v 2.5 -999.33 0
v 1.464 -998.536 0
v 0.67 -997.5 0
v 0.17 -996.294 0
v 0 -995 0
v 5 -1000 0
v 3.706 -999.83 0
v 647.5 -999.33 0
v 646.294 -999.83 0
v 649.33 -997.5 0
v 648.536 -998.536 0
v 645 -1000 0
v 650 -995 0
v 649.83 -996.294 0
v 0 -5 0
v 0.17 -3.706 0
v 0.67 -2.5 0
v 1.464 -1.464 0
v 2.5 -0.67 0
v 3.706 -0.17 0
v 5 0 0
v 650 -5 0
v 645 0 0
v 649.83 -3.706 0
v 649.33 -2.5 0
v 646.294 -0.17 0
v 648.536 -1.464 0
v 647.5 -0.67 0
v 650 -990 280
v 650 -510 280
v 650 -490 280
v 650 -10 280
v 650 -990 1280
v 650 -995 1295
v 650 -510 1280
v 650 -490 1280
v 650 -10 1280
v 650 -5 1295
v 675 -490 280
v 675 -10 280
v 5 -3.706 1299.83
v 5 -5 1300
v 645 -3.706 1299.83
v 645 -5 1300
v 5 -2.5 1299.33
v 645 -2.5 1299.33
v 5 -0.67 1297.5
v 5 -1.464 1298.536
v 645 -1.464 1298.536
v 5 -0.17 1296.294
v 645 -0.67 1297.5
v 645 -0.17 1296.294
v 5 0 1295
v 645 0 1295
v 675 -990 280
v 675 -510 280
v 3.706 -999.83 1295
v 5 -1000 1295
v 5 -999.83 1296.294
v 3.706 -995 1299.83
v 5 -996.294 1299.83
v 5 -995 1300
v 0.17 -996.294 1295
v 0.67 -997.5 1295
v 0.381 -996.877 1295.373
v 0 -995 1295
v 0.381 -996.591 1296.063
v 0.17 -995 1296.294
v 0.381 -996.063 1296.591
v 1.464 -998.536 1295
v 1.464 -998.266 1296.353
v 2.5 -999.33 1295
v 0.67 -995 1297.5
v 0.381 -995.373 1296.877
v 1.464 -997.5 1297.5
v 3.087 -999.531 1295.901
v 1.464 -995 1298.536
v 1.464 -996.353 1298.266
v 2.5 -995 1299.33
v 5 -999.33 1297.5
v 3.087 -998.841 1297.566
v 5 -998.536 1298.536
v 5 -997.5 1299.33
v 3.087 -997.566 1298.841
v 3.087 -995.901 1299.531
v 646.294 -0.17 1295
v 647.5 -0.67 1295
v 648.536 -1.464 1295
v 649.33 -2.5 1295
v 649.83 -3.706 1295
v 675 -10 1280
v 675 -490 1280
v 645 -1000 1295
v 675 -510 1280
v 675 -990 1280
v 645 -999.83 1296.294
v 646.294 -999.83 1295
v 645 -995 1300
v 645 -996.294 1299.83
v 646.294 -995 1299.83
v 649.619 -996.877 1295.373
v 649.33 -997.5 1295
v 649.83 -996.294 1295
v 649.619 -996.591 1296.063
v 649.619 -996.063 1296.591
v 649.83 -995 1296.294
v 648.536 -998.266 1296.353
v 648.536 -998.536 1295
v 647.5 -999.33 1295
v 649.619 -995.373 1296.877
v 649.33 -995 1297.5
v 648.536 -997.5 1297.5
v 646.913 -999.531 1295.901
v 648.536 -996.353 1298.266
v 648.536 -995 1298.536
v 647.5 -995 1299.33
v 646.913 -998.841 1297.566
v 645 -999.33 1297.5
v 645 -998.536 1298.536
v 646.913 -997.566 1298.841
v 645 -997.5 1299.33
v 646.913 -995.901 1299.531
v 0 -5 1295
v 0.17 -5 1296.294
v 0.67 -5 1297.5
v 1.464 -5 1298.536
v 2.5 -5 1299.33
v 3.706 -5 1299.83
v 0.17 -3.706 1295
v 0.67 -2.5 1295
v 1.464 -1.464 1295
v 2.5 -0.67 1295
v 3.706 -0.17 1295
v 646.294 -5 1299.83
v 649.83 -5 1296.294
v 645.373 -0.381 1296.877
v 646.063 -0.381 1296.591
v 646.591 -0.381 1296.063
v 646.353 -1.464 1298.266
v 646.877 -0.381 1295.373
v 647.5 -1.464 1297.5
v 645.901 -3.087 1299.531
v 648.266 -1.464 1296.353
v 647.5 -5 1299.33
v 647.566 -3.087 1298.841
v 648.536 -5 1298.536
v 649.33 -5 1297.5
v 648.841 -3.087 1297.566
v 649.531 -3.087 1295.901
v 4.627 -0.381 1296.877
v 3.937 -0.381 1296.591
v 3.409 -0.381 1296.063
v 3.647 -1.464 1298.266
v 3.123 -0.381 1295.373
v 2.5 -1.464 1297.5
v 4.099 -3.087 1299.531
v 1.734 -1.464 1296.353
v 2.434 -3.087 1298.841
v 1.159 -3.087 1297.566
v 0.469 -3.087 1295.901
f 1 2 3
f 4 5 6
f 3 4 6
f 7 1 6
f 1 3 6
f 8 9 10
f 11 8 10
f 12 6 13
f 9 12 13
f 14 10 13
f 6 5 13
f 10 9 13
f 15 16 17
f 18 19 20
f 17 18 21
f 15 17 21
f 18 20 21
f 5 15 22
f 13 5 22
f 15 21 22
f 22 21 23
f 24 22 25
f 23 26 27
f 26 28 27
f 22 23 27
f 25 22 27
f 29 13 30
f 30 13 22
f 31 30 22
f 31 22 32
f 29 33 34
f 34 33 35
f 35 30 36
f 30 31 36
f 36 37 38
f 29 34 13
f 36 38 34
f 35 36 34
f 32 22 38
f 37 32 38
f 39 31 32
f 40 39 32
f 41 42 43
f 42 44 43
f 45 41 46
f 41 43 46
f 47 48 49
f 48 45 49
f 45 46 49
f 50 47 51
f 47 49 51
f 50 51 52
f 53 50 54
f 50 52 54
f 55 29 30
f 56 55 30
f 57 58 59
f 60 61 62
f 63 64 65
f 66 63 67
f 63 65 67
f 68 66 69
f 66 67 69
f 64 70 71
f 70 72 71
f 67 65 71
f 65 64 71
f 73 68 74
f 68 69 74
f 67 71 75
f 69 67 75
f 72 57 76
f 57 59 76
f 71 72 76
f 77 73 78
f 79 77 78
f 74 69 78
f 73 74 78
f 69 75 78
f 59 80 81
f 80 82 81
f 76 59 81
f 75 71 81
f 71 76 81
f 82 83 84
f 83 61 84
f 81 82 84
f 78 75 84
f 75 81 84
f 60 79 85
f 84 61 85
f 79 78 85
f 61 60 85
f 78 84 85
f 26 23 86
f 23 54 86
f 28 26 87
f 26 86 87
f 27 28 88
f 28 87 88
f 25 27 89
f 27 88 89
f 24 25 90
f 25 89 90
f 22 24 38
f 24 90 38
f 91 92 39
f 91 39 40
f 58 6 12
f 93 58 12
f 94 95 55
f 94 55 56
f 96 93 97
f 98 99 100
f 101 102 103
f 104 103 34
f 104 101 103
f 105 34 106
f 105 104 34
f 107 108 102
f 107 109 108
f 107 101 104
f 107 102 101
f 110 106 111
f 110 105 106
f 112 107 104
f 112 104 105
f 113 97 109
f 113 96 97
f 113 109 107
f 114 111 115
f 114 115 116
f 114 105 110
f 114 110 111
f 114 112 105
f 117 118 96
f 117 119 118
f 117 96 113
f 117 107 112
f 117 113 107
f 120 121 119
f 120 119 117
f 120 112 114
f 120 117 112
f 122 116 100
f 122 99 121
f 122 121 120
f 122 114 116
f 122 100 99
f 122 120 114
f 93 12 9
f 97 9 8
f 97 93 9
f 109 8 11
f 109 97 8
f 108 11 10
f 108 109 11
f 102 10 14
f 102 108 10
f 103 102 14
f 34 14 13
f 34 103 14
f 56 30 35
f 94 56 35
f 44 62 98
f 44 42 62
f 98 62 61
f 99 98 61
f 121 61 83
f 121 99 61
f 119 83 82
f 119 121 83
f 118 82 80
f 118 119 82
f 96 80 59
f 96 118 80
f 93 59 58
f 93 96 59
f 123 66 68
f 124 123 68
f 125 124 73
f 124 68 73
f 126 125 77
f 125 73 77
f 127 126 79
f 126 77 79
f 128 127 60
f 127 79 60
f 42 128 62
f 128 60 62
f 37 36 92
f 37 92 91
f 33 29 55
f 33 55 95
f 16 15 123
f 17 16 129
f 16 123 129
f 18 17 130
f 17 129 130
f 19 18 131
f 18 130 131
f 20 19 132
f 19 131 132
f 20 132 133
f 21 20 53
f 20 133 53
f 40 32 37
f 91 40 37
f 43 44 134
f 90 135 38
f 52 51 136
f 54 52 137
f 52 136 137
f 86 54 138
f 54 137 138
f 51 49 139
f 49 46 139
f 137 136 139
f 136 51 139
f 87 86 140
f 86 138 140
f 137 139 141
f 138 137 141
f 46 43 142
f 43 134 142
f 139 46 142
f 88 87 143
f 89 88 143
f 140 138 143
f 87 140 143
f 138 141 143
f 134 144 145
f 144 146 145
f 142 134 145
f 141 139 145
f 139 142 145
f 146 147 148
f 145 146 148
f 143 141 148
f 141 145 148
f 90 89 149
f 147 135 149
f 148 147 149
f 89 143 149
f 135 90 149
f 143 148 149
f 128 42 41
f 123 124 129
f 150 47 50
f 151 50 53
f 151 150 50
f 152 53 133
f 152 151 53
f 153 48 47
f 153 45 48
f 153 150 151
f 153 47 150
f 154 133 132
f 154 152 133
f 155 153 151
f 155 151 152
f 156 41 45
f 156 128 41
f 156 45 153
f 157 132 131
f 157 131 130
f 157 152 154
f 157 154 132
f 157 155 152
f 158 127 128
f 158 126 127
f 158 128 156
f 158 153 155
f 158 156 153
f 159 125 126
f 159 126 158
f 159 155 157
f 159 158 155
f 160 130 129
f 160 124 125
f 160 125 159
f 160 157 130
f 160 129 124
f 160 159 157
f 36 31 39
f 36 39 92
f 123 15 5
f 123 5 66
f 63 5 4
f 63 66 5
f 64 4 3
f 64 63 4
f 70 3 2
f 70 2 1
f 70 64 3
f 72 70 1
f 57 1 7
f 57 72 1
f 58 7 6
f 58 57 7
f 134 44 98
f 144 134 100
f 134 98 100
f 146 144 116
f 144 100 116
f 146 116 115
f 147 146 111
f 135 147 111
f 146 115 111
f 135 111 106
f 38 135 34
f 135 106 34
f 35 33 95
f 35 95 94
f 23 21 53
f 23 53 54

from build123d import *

# Parameters (mm, degrees)
F0_W     = 650
F0_H     = 1300
F1_DEPTH = 1000
F2_W     = 480
F2_H     = 1000
F3_DEPTH = 25
F4_R     = 5


with BuildPart() as f1:
    # F0 (on Front) → F1 (new body)
    with BuildSketch(Plane.XZ):
        with Locations((325, 650)):
            Rectangle(F0_W, F0_H)
    extrude(amount=F1_DEPTH)

    # F2 (on face) → F3 (join)
    with BuildSketch(Plane.YZ.offset(650)):
        with Locations((-250, 780)):
            Rectangle(F2_W, F2_H)
        with Locations((-750, 780)):
            Rectangle(F2_W, F2_H)
    extrude(amount=F3_DEPTH)

    # F4
    f4_edges = [f1.edges().sort_by_distance(p)[0] for p in [
        (325, -1000, 1300),
        (0, -1000, 650),
        (650, -1000, 650),
        (650, -500, 1300),
        (0, -500, 1300),
        (325, 0, 1300),
        (650, 0, 650),
        (0, 0, 650),
    ]]
    fillet(f4_edges, radius=F4_R)


solid = f1.part
